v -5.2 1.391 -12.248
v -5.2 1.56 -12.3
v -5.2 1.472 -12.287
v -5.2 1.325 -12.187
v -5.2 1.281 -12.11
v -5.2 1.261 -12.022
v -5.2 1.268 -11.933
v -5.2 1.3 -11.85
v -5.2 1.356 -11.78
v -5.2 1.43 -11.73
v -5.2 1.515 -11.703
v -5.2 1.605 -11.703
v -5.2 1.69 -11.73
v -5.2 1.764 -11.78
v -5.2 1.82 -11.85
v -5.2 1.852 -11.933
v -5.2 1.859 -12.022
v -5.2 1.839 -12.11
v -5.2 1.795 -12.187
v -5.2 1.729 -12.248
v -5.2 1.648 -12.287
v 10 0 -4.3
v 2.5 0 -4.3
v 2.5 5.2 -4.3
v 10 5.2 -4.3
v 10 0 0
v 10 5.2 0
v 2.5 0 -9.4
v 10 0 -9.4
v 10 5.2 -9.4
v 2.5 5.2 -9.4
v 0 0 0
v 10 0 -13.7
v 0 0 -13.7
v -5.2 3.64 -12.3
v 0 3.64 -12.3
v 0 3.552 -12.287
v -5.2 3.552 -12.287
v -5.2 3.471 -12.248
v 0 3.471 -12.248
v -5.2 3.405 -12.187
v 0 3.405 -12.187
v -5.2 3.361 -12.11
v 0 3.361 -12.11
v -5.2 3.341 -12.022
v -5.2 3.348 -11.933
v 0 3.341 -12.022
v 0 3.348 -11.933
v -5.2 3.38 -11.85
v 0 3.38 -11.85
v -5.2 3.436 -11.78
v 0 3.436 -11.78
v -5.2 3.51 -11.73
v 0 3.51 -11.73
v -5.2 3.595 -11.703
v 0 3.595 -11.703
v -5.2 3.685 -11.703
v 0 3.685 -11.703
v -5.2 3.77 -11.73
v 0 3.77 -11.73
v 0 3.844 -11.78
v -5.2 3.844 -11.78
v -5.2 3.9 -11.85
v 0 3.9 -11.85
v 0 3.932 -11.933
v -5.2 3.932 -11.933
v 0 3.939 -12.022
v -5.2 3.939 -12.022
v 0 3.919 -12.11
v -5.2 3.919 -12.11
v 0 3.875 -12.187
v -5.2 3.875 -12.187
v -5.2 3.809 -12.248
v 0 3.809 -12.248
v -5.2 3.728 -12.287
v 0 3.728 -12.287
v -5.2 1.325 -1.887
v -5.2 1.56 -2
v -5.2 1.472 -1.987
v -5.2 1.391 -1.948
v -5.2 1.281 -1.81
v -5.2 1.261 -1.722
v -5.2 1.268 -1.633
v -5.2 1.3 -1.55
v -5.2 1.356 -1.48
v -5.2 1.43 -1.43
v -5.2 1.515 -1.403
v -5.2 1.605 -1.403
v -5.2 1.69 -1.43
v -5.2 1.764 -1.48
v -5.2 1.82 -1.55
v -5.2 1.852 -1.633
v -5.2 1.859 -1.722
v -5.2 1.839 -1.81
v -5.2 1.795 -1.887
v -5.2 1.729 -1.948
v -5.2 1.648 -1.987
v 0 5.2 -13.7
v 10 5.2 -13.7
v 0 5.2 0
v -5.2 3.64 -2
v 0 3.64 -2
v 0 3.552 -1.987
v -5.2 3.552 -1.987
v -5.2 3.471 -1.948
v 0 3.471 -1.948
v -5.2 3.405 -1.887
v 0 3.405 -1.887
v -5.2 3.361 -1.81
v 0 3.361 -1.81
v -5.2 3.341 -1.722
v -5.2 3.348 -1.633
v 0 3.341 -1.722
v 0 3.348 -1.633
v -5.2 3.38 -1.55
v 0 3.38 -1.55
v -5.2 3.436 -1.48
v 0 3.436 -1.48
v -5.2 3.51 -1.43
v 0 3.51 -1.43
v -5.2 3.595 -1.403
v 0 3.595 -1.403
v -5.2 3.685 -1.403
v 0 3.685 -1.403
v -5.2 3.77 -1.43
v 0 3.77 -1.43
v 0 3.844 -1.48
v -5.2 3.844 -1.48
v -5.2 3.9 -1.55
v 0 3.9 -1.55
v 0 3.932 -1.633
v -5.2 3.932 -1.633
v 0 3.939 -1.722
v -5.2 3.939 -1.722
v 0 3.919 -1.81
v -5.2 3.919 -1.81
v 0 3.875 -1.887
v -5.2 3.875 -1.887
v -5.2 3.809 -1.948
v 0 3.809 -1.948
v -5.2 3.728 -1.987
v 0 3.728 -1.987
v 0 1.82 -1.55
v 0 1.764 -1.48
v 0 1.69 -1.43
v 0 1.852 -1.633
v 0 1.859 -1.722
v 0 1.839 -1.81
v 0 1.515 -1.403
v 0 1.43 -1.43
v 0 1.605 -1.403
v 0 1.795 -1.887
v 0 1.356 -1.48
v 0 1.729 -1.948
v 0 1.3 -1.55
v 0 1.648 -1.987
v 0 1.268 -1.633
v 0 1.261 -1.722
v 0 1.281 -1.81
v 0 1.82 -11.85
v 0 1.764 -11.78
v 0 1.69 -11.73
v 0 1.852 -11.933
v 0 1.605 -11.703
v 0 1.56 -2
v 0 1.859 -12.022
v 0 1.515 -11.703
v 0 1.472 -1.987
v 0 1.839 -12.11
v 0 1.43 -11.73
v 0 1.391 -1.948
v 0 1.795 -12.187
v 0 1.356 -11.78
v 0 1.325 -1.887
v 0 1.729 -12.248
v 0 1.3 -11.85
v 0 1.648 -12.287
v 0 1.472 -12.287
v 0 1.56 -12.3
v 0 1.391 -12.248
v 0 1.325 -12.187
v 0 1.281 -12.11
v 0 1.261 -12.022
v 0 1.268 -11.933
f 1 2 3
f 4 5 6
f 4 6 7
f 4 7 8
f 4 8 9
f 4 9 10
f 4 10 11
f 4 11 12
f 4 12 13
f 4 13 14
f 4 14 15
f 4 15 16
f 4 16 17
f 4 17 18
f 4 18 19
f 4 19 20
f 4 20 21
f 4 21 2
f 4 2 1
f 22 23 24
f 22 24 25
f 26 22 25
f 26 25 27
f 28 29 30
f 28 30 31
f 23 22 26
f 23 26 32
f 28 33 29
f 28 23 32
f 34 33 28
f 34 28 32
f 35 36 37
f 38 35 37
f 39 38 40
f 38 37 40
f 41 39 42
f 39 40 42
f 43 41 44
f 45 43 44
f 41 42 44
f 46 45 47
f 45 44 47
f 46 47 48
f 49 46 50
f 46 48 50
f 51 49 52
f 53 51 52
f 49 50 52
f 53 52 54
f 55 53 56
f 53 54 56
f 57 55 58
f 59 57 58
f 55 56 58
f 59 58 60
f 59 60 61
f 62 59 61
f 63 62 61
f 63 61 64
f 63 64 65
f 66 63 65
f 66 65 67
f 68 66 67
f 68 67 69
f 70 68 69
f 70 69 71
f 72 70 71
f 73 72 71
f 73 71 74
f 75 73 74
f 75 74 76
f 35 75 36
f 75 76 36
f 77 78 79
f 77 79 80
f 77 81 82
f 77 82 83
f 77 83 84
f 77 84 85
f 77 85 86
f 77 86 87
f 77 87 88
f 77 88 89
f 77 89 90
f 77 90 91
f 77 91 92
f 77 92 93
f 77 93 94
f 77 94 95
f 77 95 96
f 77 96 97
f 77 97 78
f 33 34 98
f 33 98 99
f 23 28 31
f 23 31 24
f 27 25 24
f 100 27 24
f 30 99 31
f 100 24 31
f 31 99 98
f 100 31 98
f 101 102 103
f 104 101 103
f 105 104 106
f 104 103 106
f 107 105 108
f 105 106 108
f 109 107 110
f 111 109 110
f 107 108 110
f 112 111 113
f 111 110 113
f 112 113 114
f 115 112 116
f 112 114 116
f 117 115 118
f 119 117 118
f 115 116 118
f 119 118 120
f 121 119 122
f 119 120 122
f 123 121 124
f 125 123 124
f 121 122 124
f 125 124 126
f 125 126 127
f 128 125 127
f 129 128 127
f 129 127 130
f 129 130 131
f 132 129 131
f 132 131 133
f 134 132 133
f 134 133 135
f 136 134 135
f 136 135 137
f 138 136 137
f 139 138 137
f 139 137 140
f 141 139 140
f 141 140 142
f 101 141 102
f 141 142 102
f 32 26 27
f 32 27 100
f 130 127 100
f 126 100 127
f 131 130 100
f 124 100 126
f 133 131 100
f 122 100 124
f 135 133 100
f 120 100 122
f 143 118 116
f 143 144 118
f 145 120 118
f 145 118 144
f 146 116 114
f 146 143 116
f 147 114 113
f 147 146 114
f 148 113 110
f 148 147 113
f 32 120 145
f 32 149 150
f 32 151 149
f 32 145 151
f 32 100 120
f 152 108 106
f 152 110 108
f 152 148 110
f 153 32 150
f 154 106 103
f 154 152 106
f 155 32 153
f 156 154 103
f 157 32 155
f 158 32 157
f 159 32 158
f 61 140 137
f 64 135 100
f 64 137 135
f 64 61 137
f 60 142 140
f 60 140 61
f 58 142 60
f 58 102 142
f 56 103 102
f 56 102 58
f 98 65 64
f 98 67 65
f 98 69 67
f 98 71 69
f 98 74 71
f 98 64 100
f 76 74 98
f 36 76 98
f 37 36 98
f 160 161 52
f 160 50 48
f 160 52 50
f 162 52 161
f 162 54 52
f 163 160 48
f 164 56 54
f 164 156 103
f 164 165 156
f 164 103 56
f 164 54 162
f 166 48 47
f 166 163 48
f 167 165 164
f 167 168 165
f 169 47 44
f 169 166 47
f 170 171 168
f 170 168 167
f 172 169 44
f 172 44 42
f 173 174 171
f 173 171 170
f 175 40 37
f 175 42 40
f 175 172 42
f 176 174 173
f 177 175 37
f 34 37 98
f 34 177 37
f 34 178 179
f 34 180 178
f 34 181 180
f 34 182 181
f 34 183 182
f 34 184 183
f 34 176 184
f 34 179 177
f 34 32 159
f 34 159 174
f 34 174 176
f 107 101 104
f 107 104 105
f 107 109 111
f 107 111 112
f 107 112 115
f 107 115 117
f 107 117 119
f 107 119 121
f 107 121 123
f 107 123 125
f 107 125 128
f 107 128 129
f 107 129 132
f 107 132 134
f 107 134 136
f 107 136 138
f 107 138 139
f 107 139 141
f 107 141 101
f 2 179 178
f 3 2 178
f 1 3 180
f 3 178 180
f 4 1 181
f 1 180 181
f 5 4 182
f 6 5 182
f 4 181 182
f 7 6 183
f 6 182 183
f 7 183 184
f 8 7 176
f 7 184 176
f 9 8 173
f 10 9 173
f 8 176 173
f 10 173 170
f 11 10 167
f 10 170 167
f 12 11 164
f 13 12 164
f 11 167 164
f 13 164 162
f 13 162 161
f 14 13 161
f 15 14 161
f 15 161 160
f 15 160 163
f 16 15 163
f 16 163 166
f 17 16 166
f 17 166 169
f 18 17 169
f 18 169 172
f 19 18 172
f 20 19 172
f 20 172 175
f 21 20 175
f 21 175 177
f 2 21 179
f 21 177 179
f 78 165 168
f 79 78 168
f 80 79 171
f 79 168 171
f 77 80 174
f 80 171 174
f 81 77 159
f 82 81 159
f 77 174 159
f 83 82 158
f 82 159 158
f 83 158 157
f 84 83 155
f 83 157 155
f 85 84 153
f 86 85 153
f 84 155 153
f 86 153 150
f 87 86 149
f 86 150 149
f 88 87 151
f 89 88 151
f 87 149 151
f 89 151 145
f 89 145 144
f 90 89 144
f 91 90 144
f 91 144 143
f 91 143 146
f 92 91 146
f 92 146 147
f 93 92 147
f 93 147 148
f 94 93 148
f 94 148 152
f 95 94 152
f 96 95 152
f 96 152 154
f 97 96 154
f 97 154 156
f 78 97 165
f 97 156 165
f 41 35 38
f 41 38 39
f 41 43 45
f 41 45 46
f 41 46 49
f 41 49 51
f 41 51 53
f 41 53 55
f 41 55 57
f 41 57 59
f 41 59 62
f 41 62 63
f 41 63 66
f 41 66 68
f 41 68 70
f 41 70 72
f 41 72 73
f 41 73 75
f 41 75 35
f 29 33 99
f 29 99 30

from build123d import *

# Parameters (mm, degrees)
BOSS_EXTRUDE1_DEPTH = 5.2
SKETCH2_R           = 0.3
BOSS_EXTRUDE2_DEPTH = 5.2


with BuildPart() as part:
    # Sketch1 → Boss-Extrude1 (new body)
    with BuildSketch(Plane(origin=(0, 0, 0), x_dir=(1, 0, 0), z_dir=(0, 1, 0))):
        Polygon((0, 0), (0, 13.7), (10, 13.7), (10, 9.4), (2.5, 9.4), (2.5, 4.3), (10, 4.3), (10, 0), align=None)
    extrude(amount=BOSS_EXTRUDE1_DEPTH)

    # Sketch2 → Boss-Extrude2 (add)
    with BuildSketch(Plane.ZY):
        with Locations(Location((-12, 3.64, 0), (0, 0, 180))):
            Circle(SKETCH2_R)
        with Locations(Location((-1.7, 3.64, 0), (0, 0, 180))):
            Circle(SKETCH2_R)
        with Locations(Location((-1.7, 1.56, 0), (0, 0, 180))):
            Circle(SKETCH2_R)
        with Locations(Location((-12, 1.56, 0), (0, 0, 180))):
            Circle(SKETCH2_R)
    extrude(amount=BOSS_EXTRUDE2_DEPTH)


solid = part.part
